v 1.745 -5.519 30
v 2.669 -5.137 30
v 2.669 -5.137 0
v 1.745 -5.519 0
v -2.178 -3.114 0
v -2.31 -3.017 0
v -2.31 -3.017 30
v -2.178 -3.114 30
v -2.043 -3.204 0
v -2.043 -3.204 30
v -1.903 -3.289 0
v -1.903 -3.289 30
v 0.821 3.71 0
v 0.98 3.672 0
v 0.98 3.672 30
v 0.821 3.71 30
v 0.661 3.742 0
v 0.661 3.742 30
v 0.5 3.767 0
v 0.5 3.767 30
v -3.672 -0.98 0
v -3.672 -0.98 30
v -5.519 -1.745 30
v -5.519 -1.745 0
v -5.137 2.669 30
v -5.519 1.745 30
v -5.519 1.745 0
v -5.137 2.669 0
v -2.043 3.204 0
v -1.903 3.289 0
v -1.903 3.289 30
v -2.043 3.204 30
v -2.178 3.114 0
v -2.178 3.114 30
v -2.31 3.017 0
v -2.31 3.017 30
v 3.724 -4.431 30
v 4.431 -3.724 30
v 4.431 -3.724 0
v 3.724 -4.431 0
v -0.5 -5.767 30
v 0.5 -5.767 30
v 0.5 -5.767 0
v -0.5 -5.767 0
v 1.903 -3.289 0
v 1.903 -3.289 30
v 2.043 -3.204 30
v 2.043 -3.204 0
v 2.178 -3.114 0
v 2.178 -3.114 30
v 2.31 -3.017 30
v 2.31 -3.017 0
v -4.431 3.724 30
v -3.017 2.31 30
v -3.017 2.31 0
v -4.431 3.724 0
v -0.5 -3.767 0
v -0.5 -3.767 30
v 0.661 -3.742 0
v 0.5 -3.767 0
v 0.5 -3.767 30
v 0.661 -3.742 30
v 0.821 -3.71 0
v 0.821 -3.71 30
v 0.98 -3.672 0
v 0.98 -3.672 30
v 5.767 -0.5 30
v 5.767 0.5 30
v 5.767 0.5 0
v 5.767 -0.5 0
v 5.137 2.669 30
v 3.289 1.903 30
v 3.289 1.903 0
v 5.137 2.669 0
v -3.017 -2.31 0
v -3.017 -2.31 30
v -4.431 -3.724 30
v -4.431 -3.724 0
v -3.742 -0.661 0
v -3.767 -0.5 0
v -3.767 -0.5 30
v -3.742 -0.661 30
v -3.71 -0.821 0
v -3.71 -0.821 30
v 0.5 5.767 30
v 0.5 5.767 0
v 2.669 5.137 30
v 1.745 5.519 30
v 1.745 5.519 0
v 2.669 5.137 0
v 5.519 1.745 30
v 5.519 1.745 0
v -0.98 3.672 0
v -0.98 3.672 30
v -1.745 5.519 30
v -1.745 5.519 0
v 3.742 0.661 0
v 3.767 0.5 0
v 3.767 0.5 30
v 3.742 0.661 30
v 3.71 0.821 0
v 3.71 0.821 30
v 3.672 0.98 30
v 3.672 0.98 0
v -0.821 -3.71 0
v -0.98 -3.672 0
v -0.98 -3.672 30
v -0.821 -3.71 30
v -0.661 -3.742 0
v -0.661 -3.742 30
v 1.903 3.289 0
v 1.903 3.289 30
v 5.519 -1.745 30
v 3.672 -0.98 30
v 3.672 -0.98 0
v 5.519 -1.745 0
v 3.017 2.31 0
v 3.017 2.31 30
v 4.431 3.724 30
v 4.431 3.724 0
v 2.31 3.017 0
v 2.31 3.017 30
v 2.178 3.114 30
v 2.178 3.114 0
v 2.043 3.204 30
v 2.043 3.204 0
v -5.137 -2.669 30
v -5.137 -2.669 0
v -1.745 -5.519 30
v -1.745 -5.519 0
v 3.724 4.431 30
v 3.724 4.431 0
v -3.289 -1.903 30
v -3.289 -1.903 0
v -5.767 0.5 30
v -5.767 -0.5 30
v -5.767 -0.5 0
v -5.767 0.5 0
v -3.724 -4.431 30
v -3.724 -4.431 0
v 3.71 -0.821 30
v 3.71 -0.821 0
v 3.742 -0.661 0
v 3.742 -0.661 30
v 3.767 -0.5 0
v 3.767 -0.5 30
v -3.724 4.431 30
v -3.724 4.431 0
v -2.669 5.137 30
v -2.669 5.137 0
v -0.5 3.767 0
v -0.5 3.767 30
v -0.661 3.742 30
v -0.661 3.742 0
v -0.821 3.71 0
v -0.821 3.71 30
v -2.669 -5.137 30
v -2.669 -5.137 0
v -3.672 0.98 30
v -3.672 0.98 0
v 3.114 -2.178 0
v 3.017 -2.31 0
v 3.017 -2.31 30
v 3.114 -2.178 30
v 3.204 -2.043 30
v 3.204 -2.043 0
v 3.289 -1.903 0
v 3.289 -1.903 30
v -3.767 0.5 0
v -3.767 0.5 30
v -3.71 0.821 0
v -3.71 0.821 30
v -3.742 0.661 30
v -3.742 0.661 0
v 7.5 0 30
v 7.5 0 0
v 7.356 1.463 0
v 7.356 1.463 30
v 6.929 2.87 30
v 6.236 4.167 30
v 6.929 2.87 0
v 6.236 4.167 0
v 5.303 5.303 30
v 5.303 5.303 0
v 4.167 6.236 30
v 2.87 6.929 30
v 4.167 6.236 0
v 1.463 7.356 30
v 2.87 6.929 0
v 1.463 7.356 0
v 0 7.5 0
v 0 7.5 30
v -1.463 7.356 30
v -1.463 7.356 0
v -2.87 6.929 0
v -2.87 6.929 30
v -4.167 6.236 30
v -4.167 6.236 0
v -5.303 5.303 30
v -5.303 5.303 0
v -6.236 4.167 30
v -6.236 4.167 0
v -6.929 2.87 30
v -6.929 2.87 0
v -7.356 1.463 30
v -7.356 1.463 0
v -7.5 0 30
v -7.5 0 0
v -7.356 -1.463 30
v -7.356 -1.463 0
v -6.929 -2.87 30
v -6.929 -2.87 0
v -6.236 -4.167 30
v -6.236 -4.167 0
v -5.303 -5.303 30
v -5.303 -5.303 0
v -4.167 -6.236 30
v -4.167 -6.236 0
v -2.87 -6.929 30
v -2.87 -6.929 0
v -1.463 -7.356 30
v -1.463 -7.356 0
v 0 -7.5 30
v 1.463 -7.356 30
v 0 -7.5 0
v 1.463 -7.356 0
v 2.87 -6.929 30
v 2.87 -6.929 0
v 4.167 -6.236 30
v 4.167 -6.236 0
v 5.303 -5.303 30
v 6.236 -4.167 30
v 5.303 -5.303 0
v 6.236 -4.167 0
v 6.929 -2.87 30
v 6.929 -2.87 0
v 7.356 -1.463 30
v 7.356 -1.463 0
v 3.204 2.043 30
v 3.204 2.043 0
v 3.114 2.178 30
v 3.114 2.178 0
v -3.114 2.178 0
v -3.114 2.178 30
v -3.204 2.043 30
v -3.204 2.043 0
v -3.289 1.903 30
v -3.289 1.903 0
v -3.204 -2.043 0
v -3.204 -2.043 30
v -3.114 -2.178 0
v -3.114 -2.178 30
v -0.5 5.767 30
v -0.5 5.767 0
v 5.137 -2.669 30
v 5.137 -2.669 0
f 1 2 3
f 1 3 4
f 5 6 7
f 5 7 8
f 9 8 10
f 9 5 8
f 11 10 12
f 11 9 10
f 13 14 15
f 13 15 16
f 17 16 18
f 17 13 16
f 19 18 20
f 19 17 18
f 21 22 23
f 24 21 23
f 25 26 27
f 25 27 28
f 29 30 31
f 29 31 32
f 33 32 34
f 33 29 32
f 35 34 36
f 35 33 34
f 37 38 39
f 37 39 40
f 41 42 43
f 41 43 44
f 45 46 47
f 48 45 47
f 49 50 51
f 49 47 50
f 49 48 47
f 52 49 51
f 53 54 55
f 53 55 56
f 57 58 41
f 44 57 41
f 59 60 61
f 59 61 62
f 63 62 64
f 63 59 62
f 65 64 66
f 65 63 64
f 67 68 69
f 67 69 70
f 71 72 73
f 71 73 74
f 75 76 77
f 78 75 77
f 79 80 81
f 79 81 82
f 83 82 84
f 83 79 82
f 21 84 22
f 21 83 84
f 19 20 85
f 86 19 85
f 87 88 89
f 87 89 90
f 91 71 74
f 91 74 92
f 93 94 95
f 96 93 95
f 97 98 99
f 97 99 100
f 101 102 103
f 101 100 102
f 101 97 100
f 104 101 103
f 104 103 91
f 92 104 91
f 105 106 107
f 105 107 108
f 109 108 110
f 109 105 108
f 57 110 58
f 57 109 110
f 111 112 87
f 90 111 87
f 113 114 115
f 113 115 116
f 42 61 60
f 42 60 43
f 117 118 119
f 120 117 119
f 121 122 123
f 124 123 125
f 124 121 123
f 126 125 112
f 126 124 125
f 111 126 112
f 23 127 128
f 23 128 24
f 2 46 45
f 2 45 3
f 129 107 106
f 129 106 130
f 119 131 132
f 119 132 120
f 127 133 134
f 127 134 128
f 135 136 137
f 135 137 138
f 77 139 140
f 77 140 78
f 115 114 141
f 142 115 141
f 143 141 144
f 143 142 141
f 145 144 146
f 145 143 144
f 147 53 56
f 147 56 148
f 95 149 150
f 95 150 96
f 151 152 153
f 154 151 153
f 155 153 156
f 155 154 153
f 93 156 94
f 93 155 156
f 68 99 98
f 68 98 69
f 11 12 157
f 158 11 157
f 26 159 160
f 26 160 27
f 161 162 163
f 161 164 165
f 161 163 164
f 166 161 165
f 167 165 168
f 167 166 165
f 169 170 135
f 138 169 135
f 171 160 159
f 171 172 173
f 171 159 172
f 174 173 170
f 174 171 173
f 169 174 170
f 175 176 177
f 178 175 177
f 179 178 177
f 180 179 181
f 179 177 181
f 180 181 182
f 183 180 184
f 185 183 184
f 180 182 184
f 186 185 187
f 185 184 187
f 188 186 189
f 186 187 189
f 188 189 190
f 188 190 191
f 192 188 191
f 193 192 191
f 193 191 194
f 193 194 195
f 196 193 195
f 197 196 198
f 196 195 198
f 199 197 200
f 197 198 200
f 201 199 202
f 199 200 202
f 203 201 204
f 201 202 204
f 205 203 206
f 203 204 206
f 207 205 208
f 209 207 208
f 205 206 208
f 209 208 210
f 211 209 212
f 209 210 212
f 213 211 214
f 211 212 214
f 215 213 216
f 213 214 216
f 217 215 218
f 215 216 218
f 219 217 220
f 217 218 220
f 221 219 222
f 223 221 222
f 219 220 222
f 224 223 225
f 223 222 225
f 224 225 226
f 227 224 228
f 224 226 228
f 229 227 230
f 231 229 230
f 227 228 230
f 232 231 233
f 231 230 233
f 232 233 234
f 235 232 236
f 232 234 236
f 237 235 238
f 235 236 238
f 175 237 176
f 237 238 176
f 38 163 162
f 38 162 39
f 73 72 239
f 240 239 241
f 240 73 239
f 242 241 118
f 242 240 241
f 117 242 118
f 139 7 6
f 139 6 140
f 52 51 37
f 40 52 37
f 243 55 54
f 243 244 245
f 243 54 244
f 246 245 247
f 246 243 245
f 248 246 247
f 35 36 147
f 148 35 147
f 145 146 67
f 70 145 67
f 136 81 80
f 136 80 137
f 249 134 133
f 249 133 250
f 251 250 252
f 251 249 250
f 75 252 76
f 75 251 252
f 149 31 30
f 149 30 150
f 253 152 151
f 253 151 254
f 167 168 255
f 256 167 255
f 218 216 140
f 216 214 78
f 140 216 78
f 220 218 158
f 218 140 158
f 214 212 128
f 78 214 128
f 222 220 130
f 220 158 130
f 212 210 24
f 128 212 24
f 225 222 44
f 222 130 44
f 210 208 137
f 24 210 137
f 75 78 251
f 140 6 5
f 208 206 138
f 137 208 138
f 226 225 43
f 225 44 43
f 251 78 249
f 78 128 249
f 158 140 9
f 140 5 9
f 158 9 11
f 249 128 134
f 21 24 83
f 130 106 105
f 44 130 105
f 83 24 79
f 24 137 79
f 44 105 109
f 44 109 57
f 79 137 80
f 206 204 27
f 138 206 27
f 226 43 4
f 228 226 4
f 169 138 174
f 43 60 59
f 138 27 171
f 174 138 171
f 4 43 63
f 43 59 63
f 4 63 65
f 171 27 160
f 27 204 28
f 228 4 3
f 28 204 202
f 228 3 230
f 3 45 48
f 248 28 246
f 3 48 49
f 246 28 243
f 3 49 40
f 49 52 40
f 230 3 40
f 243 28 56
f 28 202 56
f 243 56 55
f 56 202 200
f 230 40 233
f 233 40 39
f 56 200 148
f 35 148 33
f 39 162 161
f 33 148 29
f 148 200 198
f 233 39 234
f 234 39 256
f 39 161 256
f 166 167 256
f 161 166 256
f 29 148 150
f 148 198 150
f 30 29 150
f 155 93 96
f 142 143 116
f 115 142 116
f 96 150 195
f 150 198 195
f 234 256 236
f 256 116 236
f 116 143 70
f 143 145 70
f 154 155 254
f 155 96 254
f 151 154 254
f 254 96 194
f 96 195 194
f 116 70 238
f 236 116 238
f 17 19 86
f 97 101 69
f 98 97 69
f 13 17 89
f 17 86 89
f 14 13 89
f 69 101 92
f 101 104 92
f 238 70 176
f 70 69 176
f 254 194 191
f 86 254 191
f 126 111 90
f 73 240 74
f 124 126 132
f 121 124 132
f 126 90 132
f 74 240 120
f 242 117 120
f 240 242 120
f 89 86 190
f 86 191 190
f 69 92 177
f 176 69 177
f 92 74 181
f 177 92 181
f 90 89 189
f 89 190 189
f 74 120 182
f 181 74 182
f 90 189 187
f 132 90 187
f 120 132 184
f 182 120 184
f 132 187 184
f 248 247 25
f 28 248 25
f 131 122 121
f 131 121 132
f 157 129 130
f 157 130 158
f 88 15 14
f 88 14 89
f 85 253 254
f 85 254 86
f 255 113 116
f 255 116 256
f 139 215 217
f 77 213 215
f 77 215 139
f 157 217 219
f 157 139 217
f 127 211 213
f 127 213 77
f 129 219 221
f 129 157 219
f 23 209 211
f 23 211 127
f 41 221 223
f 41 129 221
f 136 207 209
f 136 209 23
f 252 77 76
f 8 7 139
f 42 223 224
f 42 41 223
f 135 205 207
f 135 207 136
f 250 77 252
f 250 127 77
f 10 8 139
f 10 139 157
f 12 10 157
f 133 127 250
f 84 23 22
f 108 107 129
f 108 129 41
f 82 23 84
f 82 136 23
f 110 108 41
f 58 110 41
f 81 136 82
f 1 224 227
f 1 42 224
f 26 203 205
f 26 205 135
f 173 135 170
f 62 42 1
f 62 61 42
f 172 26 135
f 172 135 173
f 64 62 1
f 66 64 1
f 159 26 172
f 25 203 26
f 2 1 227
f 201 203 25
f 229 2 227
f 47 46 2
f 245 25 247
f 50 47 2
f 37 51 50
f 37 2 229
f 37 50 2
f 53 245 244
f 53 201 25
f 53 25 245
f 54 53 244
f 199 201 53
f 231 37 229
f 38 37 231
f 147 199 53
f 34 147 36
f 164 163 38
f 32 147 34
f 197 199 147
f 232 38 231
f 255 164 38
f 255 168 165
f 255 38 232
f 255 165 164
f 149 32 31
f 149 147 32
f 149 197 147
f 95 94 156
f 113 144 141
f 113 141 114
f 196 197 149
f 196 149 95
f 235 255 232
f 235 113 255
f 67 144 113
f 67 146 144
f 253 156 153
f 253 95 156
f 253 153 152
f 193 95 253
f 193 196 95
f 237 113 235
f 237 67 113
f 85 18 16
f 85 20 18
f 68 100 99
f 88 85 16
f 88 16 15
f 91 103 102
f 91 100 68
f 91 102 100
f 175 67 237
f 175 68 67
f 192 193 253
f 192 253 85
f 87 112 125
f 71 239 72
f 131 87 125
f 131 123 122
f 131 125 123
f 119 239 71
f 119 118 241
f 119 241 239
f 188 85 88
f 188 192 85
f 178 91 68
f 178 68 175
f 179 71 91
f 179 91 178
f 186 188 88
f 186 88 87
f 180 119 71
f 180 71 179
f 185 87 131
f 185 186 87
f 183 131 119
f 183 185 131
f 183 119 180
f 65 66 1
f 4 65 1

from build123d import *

# Parameters (mm, degrees)
SKETCH_R           = 7.5
SKETCH_R_2         = 3.8
PAD_DEPTH          = 30
SKETCH001_W        = 1
SKETCH001_H        = 2
POCKET_DEPTH       = 30
POLARPATTERN_COUNT = 16


with BuildPart() as part:
    # Sketch → Pad (new body)
    with BuildSketch(Plane.XY):
        Circle(SKETCH_R)
        Circle(SKETCH_R_2, mode=Mode.SUBTRACT)
    extrude(amount=PAD_DEPTH)

    # Sketch001 (on Face4 of Pad) → Pocket (cut)
    with BuildSketch(Plane.XY.offset(30)):
        with Locations((0, 4.766962)):
            Rectangle(SKETCH001_W, SKETCH001_H)
    pocket = extrude(amount=-POCKET_DEPTH, mode=Mode.SUBTRACT)

    # PolarPattern: Pocket ×16 about axis
    polarpattern_axis = Axis((0, 0, 30), (0, 0, 1))
    for i in range(1, POLARPATTERN_COUNT):
        add(pocket.rotate(polarpattern_axis, i * 360 / POLARPATTERN_COUNT), mode=Mode.SUBTRACT)


solid = part.part
